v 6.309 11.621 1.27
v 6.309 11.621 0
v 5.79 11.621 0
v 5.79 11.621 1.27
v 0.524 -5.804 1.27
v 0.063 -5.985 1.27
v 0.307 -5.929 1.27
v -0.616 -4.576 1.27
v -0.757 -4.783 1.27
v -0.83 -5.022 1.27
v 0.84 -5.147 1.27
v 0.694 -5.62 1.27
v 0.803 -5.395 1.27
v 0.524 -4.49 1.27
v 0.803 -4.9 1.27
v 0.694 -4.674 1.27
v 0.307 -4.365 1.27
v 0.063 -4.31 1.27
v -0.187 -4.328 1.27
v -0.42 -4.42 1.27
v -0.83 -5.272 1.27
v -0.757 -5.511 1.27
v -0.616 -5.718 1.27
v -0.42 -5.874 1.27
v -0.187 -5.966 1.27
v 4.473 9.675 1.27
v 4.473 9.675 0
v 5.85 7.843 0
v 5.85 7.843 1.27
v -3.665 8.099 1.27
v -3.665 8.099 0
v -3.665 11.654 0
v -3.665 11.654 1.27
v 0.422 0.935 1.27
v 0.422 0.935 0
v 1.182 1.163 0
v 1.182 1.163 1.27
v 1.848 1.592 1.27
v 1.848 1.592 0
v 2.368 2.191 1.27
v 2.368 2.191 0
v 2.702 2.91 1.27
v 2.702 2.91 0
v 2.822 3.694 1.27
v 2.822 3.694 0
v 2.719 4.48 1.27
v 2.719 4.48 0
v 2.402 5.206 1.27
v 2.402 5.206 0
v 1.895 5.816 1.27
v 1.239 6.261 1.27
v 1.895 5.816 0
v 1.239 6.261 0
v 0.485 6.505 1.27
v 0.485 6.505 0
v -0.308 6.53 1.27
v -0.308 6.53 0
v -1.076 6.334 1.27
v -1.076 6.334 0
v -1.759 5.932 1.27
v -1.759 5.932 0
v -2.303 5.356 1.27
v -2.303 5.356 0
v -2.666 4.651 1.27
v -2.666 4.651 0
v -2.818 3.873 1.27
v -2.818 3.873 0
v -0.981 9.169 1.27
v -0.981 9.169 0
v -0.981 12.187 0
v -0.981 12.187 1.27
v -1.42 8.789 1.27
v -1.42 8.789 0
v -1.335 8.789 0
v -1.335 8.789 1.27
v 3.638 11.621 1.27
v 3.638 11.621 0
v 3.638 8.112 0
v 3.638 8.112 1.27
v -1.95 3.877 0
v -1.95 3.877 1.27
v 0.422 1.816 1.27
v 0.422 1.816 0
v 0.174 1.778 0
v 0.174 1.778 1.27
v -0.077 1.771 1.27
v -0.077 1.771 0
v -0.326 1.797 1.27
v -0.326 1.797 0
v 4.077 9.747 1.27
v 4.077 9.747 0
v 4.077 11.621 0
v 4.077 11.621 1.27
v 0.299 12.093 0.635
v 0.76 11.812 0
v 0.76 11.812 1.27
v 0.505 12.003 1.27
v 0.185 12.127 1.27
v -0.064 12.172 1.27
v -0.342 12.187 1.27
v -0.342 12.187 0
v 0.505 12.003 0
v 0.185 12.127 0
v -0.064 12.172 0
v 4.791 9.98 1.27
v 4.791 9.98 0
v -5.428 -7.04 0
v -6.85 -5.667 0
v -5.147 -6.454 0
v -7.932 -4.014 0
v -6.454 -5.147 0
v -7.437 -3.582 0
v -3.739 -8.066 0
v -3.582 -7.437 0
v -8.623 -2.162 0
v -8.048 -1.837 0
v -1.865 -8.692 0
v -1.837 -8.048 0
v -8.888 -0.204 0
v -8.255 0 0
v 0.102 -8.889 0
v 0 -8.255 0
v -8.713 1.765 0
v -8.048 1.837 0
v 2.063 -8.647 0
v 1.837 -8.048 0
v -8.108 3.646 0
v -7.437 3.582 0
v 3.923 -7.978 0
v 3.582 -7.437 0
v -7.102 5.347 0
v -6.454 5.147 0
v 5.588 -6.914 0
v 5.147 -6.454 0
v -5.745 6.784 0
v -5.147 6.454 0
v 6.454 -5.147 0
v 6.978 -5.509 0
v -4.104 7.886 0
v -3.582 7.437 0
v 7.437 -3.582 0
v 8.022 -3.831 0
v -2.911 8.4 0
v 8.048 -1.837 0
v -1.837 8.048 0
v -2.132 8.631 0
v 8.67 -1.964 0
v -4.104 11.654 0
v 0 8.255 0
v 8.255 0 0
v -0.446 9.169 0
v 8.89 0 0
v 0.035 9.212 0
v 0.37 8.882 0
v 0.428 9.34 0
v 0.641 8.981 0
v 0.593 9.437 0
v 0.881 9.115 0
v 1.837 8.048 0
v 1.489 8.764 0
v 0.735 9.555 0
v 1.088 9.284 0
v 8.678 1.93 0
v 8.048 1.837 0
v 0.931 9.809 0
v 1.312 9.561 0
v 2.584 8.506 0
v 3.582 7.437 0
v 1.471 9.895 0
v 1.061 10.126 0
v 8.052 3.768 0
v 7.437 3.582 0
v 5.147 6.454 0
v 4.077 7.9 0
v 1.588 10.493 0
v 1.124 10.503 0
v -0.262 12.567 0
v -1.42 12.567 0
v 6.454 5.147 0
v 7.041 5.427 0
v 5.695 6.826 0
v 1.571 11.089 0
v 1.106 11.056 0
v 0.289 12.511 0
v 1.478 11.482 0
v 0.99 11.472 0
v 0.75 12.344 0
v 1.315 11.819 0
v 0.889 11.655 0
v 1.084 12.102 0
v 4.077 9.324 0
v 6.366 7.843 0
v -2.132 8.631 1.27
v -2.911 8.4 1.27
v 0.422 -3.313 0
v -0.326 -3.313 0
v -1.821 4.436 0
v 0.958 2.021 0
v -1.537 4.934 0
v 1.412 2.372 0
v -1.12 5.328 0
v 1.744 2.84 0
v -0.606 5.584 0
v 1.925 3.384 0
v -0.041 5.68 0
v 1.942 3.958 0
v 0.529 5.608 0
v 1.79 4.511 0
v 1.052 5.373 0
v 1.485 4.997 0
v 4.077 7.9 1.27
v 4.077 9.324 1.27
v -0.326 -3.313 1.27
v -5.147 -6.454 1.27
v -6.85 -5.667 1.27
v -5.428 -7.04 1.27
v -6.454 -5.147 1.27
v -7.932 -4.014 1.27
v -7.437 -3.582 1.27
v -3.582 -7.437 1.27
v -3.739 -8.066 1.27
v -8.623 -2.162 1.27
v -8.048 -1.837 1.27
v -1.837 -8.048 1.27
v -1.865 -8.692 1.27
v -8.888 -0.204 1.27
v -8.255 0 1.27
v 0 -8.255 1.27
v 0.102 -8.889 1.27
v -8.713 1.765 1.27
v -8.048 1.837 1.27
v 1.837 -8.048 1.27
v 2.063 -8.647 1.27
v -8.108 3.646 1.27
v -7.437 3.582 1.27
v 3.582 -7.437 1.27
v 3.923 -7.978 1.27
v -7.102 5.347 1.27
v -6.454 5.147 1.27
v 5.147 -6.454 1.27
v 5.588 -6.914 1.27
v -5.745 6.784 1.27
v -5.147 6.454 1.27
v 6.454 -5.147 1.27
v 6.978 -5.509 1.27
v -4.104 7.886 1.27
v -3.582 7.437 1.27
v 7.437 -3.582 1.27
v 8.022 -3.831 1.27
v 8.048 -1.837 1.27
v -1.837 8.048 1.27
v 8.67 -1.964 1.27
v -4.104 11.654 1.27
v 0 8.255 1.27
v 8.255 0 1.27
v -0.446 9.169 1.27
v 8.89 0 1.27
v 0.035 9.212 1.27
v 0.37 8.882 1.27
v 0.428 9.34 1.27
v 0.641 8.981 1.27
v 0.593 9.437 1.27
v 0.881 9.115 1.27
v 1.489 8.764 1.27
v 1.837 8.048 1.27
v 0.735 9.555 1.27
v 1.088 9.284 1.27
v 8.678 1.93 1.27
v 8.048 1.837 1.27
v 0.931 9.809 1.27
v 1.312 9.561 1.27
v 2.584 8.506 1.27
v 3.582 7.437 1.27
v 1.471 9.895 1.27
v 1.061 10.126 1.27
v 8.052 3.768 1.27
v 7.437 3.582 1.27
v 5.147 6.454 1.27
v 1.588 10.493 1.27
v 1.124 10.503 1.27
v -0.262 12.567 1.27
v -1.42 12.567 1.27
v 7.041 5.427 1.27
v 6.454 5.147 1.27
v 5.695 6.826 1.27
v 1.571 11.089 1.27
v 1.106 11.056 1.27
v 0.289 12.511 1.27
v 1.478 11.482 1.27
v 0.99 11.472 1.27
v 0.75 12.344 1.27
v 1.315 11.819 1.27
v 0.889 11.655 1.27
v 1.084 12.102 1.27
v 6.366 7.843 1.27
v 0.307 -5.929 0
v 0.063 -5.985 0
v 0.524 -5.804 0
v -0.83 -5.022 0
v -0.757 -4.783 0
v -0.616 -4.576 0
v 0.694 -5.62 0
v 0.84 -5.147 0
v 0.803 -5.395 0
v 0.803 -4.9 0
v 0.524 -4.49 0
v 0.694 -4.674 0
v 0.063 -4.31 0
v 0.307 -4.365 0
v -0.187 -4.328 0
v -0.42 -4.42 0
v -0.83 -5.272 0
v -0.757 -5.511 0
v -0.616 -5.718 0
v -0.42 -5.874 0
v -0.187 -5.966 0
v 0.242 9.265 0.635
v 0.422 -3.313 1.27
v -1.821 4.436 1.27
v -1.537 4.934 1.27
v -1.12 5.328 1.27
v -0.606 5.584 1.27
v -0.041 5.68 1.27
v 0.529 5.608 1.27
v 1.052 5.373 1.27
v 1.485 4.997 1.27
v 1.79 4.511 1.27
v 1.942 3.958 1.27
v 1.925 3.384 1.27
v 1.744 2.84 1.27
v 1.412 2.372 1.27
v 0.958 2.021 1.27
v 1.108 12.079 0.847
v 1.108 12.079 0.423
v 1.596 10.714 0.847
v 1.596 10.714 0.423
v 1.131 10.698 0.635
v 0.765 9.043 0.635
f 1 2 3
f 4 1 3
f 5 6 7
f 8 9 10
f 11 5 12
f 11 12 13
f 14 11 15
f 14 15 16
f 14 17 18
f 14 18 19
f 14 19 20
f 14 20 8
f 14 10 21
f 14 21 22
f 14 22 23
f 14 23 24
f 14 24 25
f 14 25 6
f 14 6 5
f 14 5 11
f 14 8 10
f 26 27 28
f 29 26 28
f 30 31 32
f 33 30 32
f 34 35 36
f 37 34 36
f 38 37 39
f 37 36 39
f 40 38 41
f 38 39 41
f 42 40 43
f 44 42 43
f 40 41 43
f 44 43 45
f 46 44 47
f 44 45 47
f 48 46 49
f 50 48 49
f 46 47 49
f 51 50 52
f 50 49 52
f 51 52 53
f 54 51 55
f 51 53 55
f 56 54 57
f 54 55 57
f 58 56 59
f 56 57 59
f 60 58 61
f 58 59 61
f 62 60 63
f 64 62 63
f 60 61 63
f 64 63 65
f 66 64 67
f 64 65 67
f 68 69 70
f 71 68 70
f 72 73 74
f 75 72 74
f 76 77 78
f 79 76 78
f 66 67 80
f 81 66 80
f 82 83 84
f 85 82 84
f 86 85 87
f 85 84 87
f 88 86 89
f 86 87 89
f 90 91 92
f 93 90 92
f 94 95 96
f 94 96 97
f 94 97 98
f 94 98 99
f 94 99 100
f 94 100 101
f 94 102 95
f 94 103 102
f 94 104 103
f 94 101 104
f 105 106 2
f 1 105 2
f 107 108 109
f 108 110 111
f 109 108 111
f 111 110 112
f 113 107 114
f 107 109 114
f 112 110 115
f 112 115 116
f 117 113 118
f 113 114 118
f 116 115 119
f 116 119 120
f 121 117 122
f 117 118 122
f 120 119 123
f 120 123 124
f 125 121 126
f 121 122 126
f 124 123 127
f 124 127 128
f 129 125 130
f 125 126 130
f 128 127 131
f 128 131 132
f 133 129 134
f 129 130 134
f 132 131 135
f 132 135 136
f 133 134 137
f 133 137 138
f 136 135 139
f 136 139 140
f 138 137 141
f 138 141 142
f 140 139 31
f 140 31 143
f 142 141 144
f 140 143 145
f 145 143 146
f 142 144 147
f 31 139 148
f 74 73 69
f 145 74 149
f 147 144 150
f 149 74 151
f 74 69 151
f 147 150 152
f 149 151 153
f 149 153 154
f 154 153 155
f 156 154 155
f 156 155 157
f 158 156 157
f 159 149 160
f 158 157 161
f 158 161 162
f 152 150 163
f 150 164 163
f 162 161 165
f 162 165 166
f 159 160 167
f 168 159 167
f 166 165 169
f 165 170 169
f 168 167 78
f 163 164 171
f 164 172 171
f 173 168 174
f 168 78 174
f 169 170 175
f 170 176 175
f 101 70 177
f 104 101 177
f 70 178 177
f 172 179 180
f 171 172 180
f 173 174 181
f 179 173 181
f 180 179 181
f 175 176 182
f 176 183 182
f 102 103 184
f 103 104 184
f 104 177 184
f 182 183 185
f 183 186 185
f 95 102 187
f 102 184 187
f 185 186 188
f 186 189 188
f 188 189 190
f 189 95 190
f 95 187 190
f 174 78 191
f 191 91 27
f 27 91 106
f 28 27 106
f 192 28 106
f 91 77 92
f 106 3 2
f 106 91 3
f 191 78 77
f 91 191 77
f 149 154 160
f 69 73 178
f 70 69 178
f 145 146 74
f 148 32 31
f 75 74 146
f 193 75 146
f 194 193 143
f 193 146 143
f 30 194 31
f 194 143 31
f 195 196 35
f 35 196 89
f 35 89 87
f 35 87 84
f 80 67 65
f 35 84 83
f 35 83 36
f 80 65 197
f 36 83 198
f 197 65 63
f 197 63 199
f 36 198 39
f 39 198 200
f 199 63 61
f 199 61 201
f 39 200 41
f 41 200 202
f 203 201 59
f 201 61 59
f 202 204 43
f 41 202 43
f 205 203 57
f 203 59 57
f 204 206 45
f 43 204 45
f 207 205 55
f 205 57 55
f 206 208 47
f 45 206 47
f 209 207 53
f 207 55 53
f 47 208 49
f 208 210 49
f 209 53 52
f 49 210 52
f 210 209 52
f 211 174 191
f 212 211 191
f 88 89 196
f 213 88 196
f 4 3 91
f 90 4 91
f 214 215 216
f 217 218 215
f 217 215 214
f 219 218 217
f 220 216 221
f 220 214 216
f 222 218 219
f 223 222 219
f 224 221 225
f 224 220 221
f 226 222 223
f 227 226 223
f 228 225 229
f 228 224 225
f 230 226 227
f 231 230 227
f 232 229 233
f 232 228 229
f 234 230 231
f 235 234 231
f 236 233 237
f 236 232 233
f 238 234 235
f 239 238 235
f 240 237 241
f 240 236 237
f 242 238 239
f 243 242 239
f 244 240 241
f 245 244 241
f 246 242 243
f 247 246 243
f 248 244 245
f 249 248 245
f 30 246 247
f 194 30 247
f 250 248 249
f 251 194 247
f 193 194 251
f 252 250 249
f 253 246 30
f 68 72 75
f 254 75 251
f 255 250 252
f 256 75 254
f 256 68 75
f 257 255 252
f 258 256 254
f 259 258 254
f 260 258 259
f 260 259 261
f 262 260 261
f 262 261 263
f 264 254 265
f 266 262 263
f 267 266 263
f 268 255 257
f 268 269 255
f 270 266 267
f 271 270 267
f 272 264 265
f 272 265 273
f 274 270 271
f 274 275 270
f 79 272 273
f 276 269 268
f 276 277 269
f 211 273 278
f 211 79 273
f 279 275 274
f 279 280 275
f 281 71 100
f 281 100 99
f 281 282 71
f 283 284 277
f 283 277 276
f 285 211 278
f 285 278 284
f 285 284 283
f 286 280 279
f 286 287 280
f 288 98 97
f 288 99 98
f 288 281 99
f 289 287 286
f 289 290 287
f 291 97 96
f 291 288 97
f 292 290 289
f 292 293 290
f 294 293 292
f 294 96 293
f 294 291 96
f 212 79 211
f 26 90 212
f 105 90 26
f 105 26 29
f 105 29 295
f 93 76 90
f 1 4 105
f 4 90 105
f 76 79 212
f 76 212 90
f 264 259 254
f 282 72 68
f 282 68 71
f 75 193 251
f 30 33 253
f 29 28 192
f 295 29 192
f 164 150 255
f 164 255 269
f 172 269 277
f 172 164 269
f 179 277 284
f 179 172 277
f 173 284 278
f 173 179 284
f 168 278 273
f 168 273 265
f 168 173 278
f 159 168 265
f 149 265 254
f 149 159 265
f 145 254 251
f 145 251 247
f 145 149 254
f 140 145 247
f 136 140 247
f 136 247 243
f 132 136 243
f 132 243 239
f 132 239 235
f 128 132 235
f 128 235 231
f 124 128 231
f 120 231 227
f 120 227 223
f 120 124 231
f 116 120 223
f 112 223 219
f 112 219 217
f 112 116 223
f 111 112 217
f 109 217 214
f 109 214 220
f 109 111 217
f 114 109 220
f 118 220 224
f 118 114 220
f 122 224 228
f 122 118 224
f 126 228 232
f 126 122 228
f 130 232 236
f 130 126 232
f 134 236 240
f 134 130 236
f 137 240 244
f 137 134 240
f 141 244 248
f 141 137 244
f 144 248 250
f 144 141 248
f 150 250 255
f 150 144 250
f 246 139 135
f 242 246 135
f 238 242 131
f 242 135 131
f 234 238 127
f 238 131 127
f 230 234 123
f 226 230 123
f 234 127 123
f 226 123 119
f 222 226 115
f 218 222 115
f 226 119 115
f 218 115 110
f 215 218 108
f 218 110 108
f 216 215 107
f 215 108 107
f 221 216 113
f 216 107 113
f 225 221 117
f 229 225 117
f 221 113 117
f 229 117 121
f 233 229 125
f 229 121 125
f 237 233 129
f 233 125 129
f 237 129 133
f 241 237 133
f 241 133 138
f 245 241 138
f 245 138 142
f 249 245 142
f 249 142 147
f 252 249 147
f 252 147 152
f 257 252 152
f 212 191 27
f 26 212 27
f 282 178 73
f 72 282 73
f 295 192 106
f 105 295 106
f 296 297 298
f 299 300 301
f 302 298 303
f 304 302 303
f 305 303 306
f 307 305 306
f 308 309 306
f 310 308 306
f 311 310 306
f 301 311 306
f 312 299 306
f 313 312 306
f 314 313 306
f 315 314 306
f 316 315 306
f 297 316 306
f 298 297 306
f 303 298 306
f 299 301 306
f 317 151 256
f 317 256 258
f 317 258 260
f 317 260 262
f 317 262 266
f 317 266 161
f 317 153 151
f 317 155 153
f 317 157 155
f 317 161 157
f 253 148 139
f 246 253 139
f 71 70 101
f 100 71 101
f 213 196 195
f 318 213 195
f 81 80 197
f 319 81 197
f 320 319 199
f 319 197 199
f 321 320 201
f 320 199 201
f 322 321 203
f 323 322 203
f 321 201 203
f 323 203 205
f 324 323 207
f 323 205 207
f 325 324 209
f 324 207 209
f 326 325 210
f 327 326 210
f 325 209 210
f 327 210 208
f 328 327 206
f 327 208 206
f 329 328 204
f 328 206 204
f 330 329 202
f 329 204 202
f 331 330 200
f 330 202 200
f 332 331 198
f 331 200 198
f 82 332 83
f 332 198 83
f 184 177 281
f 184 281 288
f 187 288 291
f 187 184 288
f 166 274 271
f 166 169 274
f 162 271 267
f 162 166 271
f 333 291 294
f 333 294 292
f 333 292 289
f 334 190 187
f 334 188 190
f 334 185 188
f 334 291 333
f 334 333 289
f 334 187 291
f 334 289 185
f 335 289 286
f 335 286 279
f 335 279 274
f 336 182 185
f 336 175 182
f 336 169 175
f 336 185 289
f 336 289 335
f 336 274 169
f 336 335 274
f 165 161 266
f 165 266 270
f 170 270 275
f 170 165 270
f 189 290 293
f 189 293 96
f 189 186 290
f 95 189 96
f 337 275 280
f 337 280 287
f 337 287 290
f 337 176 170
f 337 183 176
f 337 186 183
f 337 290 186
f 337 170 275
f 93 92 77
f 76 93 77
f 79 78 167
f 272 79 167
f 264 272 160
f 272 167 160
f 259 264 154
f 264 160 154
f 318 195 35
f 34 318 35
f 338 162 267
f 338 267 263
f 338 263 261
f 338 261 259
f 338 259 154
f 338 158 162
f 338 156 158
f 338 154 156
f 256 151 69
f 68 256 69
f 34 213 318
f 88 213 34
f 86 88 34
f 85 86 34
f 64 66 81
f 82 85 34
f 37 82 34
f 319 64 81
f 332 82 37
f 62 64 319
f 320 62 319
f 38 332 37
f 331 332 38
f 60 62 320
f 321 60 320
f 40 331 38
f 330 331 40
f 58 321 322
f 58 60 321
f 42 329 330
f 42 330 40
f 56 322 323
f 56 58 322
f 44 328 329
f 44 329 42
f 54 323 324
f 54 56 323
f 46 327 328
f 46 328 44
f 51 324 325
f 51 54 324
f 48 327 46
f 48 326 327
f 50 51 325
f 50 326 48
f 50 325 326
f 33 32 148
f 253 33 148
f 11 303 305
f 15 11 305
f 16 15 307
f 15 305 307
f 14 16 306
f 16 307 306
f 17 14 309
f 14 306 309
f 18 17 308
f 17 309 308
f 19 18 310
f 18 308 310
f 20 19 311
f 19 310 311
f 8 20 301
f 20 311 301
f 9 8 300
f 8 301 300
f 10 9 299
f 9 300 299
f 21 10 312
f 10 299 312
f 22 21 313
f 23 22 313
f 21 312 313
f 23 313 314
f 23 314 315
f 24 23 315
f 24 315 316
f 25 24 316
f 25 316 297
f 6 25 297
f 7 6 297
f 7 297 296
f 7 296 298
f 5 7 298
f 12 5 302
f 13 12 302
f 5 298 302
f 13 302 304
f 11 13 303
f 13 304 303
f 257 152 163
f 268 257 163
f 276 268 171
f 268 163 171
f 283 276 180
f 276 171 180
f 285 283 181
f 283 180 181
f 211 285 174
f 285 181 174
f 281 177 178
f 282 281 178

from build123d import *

# Parameters (mm, degrees)
F0_R     = 8.255
F1_DEPTH = 1.27
F2_DEPTH = 1.27
F0_R_2   = 0.8398718831


with BuildPart() as f1:
    # F0 (on Top) → F1 (new body)
    with BuildSketch(Plane.XY):
        with BuildLine():
            ThreePointArc((-4.1044425987, 7.8857879095), (-4.6121364517, -7.6000195626), (8.89, 0))
            ThreePointArc((8.89, 0), (7.5919830199, 4.625353373), (4.0769755174, 7.9000234576))
            Line((4.0769755174, 7.9000234576), (4.0769755174, 7.8430591622))
            Line((4.0769755174, 7.8430591622), (3.6379325486, 7.8430591622))
            Line((3.6379325486, 7.8430591622), (3.6379325486, 8.1115686998))
            ThreePointArc((3.6379325486, 8.1115686998), (2.0409119952, 8.6525590566), (0.3704705258, 8.8822773876))
            add(Edge.make_bspline(
                [(0.3704705258, 8.8822773876), (0.0407352156, 8.7891189852), (-0.3728971354, 8.7891189852)],
                knots=[0.5661169485, 0.5661169485, 0.5661169485, 1, 1, 1], degree=2))
            Line((-0.3728971354, 8.7891189852), (-1.335472749, 8.7891189852))
            ThreePointArc((-1.335472749, 8.7891189852), (-2.5241196909, 8.5241374805), (-3.6653996299, 8.0991941298))
            Line((-3.6653996299, 8.0991941298), (-3.6653996299, 7.8758193651))
            Line((-3.6653996299, 7.8758193651), (-4.1044425987, 7.8758193651))
            Line((-4.1044425987, 7.8758193651), (-4.1044425987, 7.8857879095))
        make_face()
        Circle(F0_R, mode=Mode.SUBTRACT)
        with BuildLine():
            Line((4.0769755174, 7.8430591622), (4.0769755174, 7.9000234576))
            ThreePointArc((4.0769755174, 7.9000234576), (3.85890392, 8.0088051878), (3.6379325486, 8.1115686998))
            Line((3.6379325486, 8.1115686998), (3.6379325486, 7.8430591622))
            Line((3.6379325486, 7.8430591622), (4.0769755174, 7.8430591622))
        make_face()
        with BuildLine():
            ThreePointArc((3.6379325486, 8.1115686998), (3.85890392, 8.0088051878), (4.0769755174, 7.9000234576))
            Line((4.0769755174, 7.9000234576), (4.0769755174, 9.3238990059))
            Line((4.0769755174, 9.3238990059), (4.4730236944, 9.6752987455))
            Line((4.4730236944, 9.6752987455), (5.8496838507, 7.8430591622))
            Line((5.8496838507, 7.8430591622), (6.3664481736, 7.8430591622))
            Line((6.3664481736, 7.8430591622), (4.7905236944, 9.9795695789))
            Line((4.7905236944, 9.9795695789), (6.3093973924, 11.6208130684))
            Line((6.3093973924, 11.6208130684), (5.7901526007, 11.6208130684))
            Line((5.7901526007, 11.6208130684), (4.0769755174, 9.7472323393))
            Line((4.0769755174, 9.7472323393), (4.0769755174, 11.6208130684))
            Line((4.0769755174, 11.6208130684), (3.6379325486, 11.6208130684))
            Line((3.6379325486, 11.6208130684), (3.6379325486, 8.1115686998))
        make_face()
        with BuildLine():
            Line((-4.1044425987, 11.6535732713), (-4.1044425987, 7.8857879095))
            ThreePointArc((-4.1044425987, 7.8857879095), (-3.88638619, 7.9955051361), (-3.6653996299, 8.0991941298))
            Line((-3.6653996299, 8.0991941298), (-3.6653996299, 11.6535732713))
            Line((-3.6653996299, 11.6535732713), (-4.1044425987, 11.6535732713))
        make_face()
        with BuildLine():
            ThreePointArc((-3.6653996299, 8.0991941298), (-3.88638619, 7.9955051361), (-4.1044425987, 7.8857879095))
            Line((-4.1044425987, 7.8857879095), (-4.1044425987, 7.8758193651))
            Line((-4.1044425987, 7.8758193651), (-3.6653996299, 7.8758193651))
            Line((-3.6653996299, 7.8758193651), (-3.6653996299, 8.0991941298))
        make_face()
        with BuildLine():
            add(Edge.make_bspline(
                [(0.3704705258, 8.8822773876), (0.0407352156, 8.7891189852), (-0.3728971354, 8.7891189852)],
                knots=[0.5661169485, 0.5661169485, 0.5661169485, 1, 1, 1], degree=2))
            ThreePointArc((0.3704705258, 8.8822773876), (-0.4847442054, 8.876774361), (-1.335472749, 8.7891189852))
            Line((-1.335472749, 8.7891189852), (-0.3728971354, 8.7891189852))
        make_face()
        with BuildLine():
            ThreePointArc((-1.335472749, 8.7891189852), (-0.4847442054, 8.876774361), (0.3704705258, 8.8822773876))
            add(Edge.make_bspline(
                [(1.0880989583, 9.2839725009), (0.8006987799, 9.0038275386), (0.3704705258, 8.8822773876)],
                knots=[0, 0, 0, 0.5661169485, 0.5661169485, 0.5661169485], degree=2))
            add(Edge.make_bspline(
                [(1.5957682292, 10.7139627352), (1.5957682292, 9.7788260165), (1.0880989583, 9.2839725009)],
                knots=[0, 0, 0, 1, 1, 1], degree=2))
            add(Edge.make_bspline(
                [(1.1075292969, 12.0786339592), (1.5957682292, 11.5903950269), (1.5957682292, 10.7139627352)],
                knots=[0, 0, 0, 1, 1, 1], degree=2))
            add(Edge.make_bspline(
                [(-0.2621028646, 12.5668728915), (0.6192903646, 12.5668728915), (1.1075292969, 12.0786339592)],
                knots=[0, 0, 0, 1, 1, 1], degree=2))
            Line((-0.2621028646, 12.5668728915), (-1.4196549479, 12.5668728915))
            Line((-1.4196549479, 12.5668728915), (-1.4196549479, 8.7891189852))
            Line((-1.4196549479, 8.7891189852), (-1.335472749, 8.7891189852))
        make_face()
        with BuildLine():
            add(Edge.make_bspline(
                [(1.13109375, 10.6982530998), (1.13109375, 11.4374327873), (0.7602636719, 11.8119835686)],
                knots=[0, 0, 0, 1, 1, 1], degree=2))
            add(Edge.make_bspline(
                [(0.7354589844, 9.5551704175), (1.13109375, 9.9417101311), (1.13109375, 10.6982530998)],
                knots=[0, 0, 0, 1, 1, 1], degree=2))
            add(Edge.make_bspline(
                [(-0.4456575521, 9.168630704), (0.3398242188, 9.168630704), (0.7354589844, 9.5551704175)],
                knots=[0, 0, 0, 1, 1, 1], degree=2))
            Line((-0.4456575521, 9.168630704), (-0.9806119792, 9.168630704))
            Line((-0.9806119792, 9.168630704), (-0.9806119792, 12.1865343498))
            Line((-0.9806119792, 12.1865343498), (-0.3423046875, 12.1865343498))
            add(Edge.make_bspline(
                [(0.7602636719, 11.8119835686), (0.3894335938, 12.1865343498), (-0.3423046875, 12.1865343498)],
                knots=[0, 0, 0, 1, 1, 1], degree=2))
        make_face(mode=Mode.SUBTRACT)
    extrude(amount=F1_DEPTH)


with BuildPart() as f2:
    # F0 (on Top) → F2 (new body)
    with BuildSketch(Plane.XY):
        with BuildLine():
            Line((-0.3262611572, 1.7971666738), (-0.3262611572, -3.3127204515))
            Line((-0.3262611572, -3.3127204515), (0.4224519944, -3.3127204515))
            Line((0.4224519944, -3.3127204515), (0.4224519944, 0.9349852992))
            ThreePointArc((0.4224519944, 0.9349852992), (1.8953202192, 5.8159838013), (-2.8181459482, 3.8726043033))
            Line((-2.8181459482, 3.8726043033), (-1.9495125412, 3.8771755831))
            ThreePointArc((-1.9495125412, 3.8771755831), (1.2826365802, 5.2011738985), (0.4224519944, 1.8159350649))
            ThreePointArc((0.4224519944, 1.8159350649), (0.0490023715, 1.7703704856), (-0.3262611572, 1.7971666738))
        make_face()
    extrude(amount=F2_DEPTH)


with BuildPart() as f2b:
    # F0 (on Top) → F2, piece 2 (new body)
    with BuildSketch(Plane.XY):
        with Locations((0, -5.1470682956)):
            Circle(F0_R_2)
    extrude(amount=F2_DEPTH)


solid = Compound([f1.part, f2.part, f2b.part])
